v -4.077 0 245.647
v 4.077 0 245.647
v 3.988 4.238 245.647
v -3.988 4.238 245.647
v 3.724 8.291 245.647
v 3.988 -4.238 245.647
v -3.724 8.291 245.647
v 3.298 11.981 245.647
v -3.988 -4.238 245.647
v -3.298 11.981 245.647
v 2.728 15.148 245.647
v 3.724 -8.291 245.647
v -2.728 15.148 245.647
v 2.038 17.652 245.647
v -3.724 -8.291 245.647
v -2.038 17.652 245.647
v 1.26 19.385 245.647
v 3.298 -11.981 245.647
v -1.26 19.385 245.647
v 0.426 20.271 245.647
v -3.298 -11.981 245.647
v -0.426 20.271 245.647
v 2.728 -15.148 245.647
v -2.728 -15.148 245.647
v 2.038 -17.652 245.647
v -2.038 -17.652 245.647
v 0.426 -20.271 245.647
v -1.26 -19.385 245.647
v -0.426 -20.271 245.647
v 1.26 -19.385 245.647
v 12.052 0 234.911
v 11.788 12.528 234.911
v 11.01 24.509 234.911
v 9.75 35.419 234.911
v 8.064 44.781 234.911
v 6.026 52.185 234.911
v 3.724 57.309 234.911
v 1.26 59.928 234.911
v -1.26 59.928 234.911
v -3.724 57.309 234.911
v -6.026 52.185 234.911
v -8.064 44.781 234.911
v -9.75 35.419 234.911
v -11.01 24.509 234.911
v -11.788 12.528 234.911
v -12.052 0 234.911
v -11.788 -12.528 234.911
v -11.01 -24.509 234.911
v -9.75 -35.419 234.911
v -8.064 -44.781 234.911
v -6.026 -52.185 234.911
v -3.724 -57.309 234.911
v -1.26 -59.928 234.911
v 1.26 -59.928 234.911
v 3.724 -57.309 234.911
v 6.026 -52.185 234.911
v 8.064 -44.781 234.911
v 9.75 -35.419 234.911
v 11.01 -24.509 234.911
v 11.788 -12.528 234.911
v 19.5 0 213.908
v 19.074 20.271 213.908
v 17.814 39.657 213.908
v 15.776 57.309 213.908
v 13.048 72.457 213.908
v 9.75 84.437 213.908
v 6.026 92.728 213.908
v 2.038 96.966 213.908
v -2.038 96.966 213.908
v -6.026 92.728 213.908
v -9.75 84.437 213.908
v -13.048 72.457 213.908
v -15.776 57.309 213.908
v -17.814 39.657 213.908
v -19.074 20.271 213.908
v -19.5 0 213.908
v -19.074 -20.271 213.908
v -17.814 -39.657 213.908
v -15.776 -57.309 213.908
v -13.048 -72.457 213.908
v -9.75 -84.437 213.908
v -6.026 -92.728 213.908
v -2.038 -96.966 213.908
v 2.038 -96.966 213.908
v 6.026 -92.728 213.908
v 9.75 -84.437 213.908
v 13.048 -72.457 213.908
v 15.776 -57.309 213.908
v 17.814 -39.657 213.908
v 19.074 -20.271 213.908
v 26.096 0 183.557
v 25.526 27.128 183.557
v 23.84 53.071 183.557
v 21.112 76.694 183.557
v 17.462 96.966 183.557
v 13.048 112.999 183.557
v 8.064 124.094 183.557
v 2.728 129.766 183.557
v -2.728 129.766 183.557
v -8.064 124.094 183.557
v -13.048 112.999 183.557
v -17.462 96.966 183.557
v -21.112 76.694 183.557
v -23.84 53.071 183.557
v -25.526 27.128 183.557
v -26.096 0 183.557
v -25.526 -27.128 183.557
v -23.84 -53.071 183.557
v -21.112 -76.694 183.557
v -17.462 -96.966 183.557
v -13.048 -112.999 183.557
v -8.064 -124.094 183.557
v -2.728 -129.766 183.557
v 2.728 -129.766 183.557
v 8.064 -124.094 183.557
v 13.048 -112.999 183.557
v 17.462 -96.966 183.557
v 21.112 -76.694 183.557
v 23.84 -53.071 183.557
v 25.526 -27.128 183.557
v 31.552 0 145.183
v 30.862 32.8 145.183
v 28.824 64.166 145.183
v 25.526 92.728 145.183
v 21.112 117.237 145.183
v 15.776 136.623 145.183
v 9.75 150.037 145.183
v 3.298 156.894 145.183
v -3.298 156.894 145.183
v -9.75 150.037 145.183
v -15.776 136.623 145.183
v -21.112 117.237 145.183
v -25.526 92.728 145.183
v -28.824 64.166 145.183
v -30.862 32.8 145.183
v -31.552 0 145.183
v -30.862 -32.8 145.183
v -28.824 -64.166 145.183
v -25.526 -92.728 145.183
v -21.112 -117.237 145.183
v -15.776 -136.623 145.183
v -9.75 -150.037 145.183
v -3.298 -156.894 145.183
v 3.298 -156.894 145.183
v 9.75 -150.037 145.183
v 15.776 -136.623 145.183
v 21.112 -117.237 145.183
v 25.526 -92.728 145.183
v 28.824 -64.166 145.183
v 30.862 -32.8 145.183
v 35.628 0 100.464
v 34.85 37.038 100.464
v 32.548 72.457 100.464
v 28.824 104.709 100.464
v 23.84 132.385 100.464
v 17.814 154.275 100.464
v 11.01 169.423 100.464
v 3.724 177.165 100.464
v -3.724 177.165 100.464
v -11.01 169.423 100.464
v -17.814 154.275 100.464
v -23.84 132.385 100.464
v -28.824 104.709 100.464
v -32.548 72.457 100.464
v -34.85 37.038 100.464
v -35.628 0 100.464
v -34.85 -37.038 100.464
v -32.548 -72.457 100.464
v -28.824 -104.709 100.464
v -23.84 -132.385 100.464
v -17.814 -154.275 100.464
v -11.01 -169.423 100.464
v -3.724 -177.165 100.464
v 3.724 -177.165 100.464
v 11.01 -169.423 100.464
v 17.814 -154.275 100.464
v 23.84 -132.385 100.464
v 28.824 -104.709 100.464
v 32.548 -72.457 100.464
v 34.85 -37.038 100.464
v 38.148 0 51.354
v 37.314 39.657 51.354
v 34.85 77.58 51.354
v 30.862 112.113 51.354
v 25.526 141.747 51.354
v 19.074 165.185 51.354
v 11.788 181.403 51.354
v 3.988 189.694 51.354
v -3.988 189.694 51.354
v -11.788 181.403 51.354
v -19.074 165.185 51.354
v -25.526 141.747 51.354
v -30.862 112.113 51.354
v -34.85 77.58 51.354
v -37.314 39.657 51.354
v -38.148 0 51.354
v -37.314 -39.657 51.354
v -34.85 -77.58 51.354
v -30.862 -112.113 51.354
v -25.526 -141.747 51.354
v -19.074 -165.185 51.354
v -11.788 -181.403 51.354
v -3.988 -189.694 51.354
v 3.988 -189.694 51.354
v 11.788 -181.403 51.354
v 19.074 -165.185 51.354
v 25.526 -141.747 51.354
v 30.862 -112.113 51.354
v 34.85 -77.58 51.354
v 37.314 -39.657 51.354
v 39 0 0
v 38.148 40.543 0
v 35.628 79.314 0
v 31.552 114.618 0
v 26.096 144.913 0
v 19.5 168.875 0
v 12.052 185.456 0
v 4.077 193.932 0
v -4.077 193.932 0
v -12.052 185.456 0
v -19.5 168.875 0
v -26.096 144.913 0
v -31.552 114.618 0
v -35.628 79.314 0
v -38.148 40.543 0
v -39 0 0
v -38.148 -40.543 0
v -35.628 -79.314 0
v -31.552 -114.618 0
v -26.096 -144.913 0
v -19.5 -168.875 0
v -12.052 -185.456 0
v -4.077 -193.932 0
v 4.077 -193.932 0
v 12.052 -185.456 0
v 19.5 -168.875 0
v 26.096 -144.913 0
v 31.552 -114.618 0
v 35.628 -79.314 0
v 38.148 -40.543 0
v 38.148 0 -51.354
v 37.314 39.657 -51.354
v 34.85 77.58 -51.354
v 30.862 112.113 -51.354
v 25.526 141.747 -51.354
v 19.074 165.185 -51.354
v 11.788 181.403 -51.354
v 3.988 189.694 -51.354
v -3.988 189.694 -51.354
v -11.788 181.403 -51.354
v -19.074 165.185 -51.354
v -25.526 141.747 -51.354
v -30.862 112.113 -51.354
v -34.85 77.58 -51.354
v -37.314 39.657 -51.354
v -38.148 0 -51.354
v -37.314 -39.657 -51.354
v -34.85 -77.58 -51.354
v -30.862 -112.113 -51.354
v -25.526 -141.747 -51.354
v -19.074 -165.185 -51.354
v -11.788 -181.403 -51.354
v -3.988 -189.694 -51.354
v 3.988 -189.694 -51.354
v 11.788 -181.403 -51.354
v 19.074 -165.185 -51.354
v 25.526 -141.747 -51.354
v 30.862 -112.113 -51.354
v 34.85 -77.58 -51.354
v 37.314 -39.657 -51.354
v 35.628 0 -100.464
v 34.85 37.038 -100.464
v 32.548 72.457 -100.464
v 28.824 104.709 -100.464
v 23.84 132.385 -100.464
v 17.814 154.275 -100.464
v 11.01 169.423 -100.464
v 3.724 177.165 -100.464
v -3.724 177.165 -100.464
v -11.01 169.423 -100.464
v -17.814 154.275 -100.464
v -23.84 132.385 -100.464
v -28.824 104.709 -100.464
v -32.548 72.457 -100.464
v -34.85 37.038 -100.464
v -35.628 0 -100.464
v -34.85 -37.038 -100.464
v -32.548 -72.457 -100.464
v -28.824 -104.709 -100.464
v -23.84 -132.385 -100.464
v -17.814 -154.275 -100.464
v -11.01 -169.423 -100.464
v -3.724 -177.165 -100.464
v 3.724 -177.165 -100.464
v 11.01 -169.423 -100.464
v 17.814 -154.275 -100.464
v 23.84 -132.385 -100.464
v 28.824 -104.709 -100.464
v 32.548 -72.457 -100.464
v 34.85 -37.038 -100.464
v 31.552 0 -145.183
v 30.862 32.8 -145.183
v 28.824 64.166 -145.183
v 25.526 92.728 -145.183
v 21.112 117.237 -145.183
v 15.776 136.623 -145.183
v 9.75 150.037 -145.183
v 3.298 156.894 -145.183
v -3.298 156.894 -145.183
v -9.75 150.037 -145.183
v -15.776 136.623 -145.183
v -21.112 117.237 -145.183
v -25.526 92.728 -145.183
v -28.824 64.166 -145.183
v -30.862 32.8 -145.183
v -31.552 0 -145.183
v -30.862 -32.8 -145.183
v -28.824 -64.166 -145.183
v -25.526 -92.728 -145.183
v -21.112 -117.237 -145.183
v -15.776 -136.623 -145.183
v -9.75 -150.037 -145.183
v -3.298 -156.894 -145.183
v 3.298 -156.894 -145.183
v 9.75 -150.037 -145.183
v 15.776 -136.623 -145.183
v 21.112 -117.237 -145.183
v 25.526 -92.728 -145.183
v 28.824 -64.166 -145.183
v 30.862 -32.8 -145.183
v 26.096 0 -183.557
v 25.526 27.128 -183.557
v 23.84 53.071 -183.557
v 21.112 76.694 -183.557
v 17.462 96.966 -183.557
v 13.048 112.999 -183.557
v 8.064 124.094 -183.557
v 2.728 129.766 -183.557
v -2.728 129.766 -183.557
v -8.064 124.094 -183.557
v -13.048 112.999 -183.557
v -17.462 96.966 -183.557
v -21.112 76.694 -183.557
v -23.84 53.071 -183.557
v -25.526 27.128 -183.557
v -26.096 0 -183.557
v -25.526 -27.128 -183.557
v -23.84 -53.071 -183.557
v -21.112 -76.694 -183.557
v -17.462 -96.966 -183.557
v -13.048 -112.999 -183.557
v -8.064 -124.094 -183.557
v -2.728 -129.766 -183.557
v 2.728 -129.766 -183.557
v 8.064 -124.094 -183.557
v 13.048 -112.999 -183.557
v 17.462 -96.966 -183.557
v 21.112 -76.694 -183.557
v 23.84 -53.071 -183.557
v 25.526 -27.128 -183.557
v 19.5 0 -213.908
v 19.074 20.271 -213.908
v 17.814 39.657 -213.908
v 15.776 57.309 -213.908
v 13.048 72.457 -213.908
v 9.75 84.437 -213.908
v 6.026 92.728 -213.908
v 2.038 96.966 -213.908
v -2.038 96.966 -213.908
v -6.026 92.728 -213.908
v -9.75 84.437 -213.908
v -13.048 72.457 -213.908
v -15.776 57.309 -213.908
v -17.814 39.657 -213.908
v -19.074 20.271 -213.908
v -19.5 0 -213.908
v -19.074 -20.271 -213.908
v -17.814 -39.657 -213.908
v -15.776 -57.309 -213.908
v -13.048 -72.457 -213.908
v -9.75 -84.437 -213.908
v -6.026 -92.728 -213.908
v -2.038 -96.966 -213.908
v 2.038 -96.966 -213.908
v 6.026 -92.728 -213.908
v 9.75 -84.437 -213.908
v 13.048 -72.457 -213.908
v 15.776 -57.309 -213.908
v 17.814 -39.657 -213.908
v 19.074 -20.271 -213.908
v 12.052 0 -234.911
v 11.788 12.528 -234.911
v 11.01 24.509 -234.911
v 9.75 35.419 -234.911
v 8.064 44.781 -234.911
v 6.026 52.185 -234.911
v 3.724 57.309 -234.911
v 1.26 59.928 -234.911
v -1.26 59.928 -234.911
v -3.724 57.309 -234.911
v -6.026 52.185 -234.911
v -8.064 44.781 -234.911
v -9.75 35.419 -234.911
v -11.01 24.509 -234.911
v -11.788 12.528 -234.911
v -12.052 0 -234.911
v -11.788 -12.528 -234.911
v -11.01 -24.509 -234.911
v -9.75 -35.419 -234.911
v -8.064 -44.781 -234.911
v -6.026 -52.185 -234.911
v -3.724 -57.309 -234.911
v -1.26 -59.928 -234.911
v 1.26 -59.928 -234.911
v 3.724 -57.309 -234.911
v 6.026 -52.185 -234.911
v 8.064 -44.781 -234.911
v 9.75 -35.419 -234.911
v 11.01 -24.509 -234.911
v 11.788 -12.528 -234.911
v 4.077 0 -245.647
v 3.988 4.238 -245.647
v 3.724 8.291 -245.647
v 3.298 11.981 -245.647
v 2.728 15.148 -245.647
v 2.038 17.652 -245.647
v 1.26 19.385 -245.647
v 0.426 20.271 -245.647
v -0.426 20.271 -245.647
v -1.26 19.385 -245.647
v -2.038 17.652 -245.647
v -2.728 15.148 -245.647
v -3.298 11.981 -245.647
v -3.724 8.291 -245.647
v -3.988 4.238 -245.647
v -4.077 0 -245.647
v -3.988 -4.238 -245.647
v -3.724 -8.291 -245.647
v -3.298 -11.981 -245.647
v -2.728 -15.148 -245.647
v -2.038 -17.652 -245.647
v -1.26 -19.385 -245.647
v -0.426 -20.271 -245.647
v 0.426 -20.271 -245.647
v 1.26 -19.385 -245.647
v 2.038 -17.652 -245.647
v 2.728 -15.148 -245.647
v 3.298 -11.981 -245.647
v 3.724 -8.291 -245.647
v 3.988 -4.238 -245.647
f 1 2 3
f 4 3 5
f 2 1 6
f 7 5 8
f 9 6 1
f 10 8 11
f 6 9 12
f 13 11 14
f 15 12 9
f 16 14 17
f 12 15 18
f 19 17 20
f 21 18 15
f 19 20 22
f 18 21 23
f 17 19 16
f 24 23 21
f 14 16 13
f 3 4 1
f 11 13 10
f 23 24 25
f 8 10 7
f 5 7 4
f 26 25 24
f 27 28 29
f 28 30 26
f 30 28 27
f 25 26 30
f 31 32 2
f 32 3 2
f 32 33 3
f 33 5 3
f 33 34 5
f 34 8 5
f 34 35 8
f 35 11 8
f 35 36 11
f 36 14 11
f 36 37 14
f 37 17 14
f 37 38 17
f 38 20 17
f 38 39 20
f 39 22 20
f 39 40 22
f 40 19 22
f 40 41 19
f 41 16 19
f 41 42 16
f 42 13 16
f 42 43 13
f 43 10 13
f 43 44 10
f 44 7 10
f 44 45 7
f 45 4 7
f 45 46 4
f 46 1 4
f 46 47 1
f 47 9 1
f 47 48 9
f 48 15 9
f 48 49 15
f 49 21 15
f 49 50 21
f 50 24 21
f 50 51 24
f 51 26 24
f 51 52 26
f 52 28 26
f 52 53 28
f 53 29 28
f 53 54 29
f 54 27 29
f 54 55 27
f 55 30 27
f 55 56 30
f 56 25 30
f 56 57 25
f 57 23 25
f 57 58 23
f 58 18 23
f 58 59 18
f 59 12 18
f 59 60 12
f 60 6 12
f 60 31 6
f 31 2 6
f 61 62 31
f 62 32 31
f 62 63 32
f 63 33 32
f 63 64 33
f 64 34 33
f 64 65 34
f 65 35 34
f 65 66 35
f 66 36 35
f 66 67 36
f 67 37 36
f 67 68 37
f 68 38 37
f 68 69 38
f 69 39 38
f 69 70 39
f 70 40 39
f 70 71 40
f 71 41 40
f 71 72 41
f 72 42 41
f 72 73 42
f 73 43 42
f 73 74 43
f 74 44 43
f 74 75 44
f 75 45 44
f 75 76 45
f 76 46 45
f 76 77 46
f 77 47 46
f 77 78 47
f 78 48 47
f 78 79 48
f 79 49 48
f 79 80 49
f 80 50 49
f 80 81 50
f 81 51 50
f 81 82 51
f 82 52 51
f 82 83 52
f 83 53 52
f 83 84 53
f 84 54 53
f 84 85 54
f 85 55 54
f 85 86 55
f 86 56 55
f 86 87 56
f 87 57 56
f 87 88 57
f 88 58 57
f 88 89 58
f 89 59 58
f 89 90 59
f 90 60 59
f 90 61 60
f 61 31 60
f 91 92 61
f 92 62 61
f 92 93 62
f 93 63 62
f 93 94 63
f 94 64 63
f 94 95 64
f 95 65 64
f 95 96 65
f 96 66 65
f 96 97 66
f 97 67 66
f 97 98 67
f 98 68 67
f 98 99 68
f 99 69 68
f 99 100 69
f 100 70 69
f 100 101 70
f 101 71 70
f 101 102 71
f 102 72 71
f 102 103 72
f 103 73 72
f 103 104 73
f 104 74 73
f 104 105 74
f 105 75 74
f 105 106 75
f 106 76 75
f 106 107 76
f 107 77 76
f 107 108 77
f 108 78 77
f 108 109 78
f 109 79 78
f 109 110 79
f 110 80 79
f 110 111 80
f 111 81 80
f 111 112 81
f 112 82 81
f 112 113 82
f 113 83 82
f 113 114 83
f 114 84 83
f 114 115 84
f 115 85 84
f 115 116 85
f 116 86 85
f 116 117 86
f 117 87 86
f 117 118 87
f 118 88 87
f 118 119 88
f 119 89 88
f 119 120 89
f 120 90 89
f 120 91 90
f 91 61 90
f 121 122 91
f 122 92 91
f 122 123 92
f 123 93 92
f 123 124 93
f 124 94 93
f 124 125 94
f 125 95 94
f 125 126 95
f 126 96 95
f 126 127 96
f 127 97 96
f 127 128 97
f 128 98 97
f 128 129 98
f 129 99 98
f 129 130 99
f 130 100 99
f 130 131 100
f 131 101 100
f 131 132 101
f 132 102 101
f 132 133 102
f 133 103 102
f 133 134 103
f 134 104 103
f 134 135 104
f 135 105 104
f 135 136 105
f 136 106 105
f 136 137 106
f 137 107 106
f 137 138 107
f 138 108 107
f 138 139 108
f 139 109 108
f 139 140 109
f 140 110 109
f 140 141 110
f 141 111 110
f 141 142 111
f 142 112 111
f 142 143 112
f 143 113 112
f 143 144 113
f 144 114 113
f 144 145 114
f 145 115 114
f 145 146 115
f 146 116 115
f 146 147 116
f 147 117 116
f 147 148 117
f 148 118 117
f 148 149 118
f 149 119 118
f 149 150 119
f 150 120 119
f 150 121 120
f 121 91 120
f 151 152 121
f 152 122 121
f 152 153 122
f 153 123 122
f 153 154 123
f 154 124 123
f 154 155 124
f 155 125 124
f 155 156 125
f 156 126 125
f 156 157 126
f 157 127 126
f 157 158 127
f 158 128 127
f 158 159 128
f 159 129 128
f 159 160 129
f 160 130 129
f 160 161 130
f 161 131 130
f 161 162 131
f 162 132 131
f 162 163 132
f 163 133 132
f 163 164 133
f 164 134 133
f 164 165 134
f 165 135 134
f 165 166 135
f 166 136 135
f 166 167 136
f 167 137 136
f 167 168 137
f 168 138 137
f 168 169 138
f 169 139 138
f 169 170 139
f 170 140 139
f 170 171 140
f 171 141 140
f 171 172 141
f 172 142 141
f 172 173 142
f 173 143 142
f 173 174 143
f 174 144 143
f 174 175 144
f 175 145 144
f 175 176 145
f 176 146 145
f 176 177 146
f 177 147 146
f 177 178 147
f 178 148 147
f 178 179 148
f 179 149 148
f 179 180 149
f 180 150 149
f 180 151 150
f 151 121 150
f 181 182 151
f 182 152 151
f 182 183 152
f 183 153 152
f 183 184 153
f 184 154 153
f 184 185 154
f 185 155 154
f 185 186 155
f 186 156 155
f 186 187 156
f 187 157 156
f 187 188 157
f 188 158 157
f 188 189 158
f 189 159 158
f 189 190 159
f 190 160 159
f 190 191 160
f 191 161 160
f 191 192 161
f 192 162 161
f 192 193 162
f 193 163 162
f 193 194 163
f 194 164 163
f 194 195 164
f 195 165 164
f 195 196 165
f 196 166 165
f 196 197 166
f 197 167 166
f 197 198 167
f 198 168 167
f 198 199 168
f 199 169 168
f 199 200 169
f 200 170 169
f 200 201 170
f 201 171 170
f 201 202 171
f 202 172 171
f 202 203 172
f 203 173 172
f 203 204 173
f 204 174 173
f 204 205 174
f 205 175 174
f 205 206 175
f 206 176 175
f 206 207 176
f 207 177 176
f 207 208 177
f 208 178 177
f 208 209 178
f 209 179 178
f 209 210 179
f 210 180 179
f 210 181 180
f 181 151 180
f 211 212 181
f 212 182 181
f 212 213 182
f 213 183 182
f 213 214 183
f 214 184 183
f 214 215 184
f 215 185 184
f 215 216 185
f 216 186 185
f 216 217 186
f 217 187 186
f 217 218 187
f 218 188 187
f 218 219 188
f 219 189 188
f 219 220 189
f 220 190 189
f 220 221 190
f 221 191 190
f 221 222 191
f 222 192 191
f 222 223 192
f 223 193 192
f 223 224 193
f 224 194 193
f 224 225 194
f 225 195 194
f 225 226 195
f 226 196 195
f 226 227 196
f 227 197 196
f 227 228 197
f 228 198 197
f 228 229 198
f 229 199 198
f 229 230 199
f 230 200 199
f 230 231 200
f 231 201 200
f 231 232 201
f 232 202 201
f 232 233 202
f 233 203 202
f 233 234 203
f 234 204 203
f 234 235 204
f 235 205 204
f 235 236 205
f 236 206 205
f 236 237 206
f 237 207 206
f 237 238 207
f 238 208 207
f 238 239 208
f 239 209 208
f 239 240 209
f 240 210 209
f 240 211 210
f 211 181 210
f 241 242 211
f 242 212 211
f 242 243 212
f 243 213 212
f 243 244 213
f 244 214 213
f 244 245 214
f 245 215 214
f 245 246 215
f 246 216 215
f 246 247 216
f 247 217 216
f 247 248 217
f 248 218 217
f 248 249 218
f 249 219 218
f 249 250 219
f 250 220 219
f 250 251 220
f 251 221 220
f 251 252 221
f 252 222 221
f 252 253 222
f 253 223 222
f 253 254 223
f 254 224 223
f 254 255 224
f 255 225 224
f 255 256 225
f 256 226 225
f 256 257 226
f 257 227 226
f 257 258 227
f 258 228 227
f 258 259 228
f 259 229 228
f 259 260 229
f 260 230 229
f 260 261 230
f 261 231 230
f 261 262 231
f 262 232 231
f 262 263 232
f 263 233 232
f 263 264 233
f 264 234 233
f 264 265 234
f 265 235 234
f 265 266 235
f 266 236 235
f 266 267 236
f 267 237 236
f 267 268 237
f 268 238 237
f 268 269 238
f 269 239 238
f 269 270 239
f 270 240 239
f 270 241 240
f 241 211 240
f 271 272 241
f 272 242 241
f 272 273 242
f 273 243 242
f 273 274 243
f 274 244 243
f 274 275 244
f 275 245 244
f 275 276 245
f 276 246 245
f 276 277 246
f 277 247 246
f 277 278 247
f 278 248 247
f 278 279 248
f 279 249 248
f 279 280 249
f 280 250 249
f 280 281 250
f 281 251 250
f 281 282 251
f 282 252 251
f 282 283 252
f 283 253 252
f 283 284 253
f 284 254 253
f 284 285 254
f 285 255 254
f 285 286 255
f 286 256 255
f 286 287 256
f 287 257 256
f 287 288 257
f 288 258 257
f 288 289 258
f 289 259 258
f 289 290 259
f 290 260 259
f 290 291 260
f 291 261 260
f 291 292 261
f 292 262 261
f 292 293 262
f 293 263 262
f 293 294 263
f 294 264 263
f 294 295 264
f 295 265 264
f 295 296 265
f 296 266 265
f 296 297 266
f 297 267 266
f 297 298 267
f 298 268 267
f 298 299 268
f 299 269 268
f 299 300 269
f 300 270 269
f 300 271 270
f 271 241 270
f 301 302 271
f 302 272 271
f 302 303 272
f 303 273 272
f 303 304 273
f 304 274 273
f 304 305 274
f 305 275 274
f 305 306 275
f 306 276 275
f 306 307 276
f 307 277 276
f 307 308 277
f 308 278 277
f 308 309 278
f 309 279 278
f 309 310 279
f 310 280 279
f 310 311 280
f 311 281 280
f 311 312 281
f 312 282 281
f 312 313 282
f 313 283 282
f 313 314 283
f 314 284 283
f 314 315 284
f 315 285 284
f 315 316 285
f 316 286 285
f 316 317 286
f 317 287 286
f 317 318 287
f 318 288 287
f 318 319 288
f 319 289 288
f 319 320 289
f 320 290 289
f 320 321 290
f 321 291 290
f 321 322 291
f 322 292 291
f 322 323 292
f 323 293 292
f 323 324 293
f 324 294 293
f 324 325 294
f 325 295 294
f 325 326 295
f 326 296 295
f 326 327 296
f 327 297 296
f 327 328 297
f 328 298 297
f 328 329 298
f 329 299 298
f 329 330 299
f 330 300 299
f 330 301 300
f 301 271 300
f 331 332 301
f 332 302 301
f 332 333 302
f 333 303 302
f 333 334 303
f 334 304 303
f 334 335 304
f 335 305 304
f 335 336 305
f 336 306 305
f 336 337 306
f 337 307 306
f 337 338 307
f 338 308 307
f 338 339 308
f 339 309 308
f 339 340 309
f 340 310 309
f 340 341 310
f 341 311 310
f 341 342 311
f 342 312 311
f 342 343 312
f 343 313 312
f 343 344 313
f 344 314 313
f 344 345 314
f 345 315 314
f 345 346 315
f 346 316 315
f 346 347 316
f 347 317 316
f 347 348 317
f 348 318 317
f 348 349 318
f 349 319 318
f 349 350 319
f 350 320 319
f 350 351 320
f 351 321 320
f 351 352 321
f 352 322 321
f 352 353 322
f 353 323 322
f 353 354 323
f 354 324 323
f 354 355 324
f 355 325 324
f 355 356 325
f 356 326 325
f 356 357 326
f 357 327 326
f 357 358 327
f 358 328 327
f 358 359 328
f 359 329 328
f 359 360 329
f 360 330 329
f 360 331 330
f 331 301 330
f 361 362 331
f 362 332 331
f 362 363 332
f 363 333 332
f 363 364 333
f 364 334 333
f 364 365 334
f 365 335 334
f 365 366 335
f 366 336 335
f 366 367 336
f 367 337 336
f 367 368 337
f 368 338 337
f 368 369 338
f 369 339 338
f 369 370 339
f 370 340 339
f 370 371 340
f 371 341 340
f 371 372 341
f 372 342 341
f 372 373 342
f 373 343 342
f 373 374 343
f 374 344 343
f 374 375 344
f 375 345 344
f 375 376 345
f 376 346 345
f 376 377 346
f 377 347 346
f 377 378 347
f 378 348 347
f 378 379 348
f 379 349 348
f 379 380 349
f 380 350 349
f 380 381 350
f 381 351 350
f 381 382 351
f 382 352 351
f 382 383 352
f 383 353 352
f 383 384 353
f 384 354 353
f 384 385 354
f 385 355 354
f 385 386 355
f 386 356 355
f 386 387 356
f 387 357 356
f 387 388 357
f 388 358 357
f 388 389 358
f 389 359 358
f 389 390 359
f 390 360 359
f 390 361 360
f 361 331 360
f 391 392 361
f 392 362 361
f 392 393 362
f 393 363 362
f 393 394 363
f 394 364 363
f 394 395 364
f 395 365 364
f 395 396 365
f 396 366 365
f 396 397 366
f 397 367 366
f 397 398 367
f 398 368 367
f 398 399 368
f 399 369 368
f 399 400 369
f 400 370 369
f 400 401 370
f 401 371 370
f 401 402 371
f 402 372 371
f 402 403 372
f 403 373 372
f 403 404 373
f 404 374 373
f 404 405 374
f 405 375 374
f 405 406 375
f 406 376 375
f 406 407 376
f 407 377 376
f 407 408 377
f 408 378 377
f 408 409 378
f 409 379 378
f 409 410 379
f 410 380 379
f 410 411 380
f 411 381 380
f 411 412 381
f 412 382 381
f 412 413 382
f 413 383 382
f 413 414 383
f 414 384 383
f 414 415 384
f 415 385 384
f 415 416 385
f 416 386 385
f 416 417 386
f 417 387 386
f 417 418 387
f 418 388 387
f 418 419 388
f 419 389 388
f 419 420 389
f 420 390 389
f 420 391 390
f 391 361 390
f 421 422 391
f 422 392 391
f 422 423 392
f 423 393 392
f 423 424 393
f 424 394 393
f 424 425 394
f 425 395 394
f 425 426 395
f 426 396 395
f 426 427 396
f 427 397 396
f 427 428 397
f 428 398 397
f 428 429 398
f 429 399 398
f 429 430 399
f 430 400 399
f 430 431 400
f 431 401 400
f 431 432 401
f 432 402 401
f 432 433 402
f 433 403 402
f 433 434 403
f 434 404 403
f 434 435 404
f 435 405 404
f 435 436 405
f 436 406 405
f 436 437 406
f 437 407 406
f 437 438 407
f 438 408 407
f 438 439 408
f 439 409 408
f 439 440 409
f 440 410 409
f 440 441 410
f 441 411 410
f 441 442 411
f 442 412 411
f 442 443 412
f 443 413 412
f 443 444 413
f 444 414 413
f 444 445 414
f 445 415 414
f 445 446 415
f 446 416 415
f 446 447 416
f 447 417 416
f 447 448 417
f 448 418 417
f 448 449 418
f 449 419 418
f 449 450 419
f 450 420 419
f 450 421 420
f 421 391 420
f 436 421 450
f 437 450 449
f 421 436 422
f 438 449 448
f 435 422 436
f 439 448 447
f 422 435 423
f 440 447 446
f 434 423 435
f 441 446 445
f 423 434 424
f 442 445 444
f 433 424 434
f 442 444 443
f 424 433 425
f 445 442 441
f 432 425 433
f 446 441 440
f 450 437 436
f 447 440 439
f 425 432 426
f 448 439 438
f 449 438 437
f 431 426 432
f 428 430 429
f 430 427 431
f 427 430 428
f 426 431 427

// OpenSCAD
// Generated by SolidPython 1.0.1 on 2020-07-29 00:46:45


scale(v = [3, 15, 19]) {
	sphere(r = 13);
}
/***********************************************
*********      SolidPython code:      **********
************************************************
 
# import packages: SolidPython
from solid import *
from solid.utils import *
from itertools import chain, combinations, permutations


class Resize:

    def __init__(self, scad_file):
        self.scad_file = scad_file
        #self.scad_file = import_scad(scad_file)
        # cone/cylinder param:
        self.r1 = 0
        self.r2 = 0
        self.h = 0
        # rectangular prism param:
        self.w = 0
        self.l = 0
        # ellipse param:
        self.r = 0

    # import OpenScad code (file name corresponds to shape)


    # classify shape + parameters
    def assign(self, param1, param2, param3):
        if self.scad_file == 'cone.scad':
            self.r1 = param1
            self.r2 = param2
            self.h = param3
        elif self.scad_file == 'cylinder.scad':
            self.r1 = param1
            self.r2 = param2
            self.h = param3
        elif self.scad_file == 'rectangularPrism.scad':
            self.h = param1
            self.l = param2
            self.w = param3
        else:
            self.r = param1
            self.h = param2

    # resize parameters
    def iterate(self):
        x = range(3, 20, 2)
        i = 1
        if self.scad_file == 'cone.scad':
            tempList = list(permutations(x, 2))
            for temp in tempList:
                param1 = temp[0]
                param2 = temp[1]
                filepath = 'produced_scad_files/' + 'cone' + str(param1) + '_' + str(param2) + '_' + '.scad'
                scad_render_to_file(cylinder(h=param1, r1=param2, r2=0), filepath)

        elif self.scad_file == 'cylinder.scad':
            tempList = list(permutations(x, 3))
            for temp in tempList:
                param1 = temp[0]
                param2 = temp[1]
                filepath = 'produced_scad_files/' + 'cylinder' + str(param1) + '_' + str(param2) + '_' + '.scad'
                scad_render_to_file(cylinder(h=param1, r1=param2, r2=param2), filepath)

        elif self.scad_file == 'rectangularPrism.scad':
            tempList = list(permutations(x, 3))
            for temp in tempList:
                param1 = temp[0]
                param2 = temp[1]
                param3 = temp[2]
                filepath = 'produced_scad_files/' + 'rectangularPrism' + str(param1) + '_' + str(param2) + '_' + str(
                    param3) + '.scad'
                scad_render_to_file(cube(size=(param1, param2, param3)), filepath)

        elif self.scad_file == 'ellipse.scad':
            tempList = list(permutations(x, 4))
            for temp in tempList:
                param1 = temp[0]
                param2 = temp[1]
                param3 = temp[2]
                param4 = temp[3]
                filepath = 'produced_scad_files/' + 'ellipse' + str(param1) + '_' + str(param2) + '_' + str(param3) + '_' + str(param4) + '.scad'
                scad_render_to_file(scale([param1, param2, param3])(sphere(r=param4)), filepath)

    def render_to_scadfile(self):
        scad_render_to_file(scad, 'example.scad') 
 
************************************************/
